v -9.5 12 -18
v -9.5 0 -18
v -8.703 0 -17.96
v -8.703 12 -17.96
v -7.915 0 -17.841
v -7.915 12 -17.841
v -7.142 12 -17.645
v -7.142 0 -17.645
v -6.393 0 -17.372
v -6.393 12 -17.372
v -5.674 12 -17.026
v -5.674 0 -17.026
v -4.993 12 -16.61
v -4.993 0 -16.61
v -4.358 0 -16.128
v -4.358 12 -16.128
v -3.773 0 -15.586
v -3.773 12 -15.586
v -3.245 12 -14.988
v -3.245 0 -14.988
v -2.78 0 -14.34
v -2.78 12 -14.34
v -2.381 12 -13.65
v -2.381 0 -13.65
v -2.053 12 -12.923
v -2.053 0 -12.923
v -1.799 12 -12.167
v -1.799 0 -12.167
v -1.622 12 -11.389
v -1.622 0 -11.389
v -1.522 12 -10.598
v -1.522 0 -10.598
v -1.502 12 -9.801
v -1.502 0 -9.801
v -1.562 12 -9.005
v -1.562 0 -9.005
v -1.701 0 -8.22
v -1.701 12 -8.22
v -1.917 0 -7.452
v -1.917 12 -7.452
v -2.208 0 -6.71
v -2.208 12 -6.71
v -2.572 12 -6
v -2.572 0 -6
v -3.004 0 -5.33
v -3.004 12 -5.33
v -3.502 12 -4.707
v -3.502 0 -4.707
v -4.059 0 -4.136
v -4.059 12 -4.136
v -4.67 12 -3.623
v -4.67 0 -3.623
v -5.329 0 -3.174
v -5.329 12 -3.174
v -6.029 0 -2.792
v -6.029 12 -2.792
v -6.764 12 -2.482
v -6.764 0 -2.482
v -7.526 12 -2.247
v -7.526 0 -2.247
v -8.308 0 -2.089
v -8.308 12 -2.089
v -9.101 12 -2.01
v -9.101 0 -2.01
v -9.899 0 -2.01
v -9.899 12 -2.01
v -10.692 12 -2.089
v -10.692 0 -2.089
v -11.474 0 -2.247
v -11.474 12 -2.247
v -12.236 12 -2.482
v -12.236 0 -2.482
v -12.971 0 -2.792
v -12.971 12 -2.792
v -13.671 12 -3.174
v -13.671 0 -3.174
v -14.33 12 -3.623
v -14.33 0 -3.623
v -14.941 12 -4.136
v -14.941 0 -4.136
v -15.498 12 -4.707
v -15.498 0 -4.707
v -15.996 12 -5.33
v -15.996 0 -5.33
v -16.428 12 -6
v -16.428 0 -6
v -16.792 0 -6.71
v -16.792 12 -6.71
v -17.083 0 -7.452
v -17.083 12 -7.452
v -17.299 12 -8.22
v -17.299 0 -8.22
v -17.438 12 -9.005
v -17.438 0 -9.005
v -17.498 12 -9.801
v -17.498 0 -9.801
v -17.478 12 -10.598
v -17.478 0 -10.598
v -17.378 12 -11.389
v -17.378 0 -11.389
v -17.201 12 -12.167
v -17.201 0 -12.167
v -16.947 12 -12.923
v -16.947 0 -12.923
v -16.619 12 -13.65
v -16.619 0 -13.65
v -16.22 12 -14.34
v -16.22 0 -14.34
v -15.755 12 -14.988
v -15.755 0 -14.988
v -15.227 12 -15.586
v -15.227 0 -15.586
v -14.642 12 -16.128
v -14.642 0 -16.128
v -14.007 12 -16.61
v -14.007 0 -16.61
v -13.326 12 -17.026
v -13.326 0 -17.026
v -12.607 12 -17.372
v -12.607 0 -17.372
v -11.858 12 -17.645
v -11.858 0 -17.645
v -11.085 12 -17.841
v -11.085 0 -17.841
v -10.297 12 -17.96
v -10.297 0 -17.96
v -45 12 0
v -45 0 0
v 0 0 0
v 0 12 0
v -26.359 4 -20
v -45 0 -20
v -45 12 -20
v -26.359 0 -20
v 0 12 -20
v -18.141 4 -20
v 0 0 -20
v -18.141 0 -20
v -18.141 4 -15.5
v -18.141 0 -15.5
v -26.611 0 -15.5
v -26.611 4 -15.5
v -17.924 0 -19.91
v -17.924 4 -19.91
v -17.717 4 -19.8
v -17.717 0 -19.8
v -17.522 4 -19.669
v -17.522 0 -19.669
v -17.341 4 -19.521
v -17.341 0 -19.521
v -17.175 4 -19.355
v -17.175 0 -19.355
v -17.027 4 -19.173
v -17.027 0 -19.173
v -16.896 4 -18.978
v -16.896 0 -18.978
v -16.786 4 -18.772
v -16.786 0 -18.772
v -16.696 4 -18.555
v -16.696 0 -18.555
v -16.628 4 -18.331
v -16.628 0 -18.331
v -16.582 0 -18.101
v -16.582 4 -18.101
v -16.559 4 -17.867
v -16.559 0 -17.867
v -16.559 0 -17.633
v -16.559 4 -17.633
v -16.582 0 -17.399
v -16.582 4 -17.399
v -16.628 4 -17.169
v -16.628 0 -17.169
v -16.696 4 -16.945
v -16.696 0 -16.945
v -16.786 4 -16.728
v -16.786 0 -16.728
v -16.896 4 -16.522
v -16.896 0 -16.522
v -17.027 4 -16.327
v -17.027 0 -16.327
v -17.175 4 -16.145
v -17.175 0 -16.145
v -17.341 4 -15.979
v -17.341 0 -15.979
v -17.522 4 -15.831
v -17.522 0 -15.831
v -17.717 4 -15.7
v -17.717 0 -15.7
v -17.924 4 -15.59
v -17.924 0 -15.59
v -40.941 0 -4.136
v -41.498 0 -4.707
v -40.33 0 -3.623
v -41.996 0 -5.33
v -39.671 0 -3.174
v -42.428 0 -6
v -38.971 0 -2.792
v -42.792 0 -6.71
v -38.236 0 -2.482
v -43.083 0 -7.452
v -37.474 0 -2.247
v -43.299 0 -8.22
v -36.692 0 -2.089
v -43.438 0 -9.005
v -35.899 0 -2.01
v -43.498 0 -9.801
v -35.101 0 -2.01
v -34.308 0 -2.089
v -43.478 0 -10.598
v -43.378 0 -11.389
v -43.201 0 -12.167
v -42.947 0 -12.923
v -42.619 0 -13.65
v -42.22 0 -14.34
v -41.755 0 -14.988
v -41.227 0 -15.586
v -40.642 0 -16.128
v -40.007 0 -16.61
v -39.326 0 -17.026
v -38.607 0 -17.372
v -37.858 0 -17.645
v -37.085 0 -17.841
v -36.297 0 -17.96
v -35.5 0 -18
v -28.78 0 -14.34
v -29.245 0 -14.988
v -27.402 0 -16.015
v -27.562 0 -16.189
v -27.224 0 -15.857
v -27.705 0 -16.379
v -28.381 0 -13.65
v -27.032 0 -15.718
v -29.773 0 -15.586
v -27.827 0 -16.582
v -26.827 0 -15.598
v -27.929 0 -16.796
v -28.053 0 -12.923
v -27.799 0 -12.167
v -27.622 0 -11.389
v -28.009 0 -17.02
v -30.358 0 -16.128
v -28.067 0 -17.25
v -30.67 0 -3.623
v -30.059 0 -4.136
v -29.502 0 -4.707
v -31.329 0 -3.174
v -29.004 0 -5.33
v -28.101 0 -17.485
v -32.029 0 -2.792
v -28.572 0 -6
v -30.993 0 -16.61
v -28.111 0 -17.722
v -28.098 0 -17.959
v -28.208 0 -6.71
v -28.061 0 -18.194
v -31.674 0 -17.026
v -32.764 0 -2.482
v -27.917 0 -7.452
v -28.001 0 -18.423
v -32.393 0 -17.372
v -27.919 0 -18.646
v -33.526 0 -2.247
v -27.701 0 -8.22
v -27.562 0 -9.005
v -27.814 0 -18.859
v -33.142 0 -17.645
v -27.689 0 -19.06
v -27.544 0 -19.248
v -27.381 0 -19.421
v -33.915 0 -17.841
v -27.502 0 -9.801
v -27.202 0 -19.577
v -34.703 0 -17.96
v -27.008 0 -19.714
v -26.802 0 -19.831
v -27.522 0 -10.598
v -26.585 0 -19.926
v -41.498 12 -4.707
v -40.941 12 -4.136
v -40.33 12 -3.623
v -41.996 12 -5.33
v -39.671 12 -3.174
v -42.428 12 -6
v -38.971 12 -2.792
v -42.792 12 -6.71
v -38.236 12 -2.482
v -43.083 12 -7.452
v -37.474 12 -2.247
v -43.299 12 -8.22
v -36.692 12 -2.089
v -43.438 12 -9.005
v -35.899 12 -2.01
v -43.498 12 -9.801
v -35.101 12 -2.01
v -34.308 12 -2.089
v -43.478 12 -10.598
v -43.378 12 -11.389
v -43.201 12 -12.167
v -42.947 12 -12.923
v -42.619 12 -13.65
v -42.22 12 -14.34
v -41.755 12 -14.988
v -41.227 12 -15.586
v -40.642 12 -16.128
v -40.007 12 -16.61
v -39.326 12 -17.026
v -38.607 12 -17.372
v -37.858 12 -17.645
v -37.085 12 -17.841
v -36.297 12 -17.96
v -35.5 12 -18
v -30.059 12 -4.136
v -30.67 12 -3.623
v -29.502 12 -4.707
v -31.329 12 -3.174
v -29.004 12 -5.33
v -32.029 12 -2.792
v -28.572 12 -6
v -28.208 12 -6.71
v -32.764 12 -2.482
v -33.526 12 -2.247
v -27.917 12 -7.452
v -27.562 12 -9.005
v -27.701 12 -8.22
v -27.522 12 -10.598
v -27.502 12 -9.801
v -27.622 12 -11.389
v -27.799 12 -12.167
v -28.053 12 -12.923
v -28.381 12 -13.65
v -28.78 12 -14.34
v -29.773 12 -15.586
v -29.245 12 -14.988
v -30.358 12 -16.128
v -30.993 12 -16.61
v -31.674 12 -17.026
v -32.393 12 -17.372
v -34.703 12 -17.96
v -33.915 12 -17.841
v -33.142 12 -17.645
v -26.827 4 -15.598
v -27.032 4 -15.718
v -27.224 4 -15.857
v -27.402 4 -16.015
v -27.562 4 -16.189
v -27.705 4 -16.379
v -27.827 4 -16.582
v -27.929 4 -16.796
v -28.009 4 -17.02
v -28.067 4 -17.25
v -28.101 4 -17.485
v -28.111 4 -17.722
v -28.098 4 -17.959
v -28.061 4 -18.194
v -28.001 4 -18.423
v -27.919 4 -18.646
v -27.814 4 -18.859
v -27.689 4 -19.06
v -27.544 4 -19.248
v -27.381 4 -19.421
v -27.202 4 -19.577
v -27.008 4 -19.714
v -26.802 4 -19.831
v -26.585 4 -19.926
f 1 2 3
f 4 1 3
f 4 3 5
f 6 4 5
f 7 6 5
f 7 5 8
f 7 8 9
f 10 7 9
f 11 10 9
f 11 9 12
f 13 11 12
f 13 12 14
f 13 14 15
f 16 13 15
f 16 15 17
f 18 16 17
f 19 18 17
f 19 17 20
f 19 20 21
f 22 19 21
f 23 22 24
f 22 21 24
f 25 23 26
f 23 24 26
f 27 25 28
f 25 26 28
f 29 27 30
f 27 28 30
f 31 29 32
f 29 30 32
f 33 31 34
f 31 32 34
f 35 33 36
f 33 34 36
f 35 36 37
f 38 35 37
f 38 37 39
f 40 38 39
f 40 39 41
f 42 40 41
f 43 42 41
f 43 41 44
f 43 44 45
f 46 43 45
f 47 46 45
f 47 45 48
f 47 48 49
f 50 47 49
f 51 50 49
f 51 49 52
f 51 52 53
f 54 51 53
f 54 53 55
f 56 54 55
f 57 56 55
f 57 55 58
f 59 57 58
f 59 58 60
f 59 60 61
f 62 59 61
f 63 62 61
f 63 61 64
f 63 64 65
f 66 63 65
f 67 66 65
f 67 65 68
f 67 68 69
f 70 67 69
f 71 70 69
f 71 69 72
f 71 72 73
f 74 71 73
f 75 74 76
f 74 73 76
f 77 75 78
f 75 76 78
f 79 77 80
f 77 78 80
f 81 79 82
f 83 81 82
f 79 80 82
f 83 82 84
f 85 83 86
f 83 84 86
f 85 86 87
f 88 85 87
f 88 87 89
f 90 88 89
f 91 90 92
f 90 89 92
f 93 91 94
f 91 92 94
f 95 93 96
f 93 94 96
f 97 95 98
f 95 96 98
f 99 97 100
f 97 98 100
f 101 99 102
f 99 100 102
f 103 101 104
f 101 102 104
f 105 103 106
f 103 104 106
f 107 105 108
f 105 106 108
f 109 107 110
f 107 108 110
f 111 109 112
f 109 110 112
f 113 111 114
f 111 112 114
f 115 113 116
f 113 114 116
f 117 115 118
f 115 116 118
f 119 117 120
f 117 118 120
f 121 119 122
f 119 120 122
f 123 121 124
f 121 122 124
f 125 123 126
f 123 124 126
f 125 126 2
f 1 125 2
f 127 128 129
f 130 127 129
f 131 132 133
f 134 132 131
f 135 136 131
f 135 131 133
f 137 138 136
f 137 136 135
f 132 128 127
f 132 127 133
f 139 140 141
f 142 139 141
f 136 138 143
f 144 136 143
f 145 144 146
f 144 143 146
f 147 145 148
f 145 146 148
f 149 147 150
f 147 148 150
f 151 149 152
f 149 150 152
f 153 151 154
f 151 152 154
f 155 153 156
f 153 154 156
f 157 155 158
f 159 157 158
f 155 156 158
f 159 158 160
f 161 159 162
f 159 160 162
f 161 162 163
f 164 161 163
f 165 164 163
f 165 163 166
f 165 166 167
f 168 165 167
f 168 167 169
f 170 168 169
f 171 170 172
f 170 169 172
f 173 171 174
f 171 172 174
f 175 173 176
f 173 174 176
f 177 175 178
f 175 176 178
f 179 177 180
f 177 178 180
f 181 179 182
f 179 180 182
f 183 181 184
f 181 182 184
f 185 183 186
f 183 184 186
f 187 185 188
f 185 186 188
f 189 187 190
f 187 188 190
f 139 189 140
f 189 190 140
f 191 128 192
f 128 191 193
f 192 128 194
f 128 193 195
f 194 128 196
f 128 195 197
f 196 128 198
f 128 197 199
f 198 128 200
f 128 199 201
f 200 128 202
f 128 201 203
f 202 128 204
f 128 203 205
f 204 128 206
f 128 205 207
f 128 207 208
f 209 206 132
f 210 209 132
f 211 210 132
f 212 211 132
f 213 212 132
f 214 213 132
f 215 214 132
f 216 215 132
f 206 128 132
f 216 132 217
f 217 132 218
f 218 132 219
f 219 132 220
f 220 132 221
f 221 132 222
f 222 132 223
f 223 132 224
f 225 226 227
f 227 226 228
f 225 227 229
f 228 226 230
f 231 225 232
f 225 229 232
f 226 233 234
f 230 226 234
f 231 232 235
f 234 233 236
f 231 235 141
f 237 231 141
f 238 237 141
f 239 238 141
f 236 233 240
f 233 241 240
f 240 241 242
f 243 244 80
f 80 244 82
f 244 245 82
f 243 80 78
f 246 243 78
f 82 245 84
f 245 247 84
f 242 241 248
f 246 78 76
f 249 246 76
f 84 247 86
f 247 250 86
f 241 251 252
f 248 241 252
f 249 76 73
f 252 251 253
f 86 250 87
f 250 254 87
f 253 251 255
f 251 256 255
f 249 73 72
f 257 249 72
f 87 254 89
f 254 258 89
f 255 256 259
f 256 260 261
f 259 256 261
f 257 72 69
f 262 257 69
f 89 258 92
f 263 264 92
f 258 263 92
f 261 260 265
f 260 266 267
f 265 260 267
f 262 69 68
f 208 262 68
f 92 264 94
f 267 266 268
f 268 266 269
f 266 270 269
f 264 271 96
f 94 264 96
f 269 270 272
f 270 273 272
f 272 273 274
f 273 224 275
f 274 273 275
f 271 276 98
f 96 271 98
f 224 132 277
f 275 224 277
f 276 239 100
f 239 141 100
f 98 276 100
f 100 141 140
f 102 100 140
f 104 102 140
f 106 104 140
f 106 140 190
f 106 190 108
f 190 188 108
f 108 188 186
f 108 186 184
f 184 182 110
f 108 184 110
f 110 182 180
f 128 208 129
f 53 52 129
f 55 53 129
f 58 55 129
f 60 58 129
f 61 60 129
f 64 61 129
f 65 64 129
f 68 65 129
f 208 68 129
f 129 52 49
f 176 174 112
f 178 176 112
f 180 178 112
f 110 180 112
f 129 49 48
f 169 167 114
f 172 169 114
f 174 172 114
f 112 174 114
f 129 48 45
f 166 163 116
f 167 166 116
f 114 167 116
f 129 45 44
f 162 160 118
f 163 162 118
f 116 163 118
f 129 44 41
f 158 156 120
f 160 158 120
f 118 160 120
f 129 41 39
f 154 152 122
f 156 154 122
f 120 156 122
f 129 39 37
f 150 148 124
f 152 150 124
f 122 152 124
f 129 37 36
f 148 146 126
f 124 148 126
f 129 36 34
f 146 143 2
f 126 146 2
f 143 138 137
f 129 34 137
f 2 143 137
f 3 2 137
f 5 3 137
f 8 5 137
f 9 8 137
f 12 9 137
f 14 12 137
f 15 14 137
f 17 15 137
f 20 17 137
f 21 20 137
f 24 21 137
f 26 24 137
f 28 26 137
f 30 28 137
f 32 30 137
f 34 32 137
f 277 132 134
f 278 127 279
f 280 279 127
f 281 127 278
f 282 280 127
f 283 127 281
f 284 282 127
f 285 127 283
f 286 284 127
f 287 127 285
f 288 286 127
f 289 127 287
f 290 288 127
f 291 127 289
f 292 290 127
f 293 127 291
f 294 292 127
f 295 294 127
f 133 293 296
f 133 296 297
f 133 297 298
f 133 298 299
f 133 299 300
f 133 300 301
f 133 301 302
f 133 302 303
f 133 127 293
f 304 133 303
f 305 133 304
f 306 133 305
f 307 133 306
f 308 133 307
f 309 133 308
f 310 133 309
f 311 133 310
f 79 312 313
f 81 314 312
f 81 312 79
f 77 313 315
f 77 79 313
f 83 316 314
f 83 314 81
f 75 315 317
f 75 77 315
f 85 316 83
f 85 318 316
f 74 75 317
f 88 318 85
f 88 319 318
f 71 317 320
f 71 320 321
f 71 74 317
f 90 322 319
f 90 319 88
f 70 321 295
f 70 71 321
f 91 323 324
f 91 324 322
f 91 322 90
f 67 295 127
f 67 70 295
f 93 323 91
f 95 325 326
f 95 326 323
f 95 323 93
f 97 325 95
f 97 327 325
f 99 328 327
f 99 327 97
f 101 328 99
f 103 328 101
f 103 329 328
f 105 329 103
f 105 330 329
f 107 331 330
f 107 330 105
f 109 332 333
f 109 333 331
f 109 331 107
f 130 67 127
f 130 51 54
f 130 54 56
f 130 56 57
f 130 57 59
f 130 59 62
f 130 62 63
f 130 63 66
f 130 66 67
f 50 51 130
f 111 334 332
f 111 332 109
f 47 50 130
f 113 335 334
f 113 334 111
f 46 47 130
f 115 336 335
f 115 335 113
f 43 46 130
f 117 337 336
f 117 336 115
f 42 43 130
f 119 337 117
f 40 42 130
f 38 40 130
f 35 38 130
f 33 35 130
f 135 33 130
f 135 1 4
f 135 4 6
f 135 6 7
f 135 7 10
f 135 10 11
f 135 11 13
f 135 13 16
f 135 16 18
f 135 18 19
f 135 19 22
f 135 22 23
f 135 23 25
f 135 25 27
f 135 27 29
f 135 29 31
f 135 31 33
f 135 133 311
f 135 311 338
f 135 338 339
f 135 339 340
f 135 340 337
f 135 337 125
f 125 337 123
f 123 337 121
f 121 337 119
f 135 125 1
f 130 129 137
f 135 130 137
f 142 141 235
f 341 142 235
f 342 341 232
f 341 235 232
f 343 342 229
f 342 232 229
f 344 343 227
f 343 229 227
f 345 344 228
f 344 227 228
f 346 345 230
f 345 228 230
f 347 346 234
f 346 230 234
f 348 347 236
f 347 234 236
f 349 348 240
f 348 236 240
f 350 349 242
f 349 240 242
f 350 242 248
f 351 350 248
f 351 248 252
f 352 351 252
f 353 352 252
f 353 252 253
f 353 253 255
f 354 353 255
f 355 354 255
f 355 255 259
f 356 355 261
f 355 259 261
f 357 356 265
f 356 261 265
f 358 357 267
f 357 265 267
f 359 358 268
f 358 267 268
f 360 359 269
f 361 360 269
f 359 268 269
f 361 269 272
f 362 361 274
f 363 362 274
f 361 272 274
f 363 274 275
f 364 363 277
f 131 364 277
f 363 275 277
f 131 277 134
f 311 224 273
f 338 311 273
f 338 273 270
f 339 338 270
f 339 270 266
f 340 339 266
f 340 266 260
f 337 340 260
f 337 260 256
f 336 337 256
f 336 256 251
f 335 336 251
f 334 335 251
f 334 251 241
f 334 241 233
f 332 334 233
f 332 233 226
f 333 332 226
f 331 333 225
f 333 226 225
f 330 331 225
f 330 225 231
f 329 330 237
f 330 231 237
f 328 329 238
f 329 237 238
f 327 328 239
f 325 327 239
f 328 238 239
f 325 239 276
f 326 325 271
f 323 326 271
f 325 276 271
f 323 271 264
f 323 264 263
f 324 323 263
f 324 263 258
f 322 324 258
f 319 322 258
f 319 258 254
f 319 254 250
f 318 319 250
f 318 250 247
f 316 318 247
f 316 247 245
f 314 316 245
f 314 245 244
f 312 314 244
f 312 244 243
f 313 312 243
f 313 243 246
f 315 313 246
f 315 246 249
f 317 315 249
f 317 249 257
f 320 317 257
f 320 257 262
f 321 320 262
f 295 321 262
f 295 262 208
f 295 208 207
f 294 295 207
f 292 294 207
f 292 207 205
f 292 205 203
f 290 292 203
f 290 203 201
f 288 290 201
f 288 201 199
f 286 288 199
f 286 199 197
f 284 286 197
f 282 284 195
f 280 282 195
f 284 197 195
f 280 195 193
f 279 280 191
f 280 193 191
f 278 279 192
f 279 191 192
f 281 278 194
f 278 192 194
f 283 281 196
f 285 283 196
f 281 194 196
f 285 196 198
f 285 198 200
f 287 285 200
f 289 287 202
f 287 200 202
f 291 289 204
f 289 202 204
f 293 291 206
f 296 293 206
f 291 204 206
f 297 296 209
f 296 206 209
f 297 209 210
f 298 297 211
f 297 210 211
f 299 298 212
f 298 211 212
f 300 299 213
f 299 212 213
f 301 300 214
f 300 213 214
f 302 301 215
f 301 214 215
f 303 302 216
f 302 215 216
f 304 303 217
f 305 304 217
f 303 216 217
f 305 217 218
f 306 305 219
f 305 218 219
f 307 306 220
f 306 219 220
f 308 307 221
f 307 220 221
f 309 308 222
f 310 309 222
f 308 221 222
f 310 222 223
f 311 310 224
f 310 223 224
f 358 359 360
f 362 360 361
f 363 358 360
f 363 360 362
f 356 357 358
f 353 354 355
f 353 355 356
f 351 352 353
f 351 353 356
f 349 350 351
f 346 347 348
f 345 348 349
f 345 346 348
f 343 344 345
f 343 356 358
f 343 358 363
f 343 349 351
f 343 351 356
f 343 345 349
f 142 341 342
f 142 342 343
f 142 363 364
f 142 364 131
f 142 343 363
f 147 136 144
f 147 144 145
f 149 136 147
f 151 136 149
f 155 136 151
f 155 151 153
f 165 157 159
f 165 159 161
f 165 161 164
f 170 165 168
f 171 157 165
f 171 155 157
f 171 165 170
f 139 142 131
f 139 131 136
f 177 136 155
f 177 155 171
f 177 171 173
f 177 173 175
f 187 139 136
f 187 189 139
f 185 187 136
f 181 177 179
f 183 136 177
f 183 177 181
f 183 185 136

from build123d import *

# Parameters (mm, degrees)
SKETCH1_W           = 45
SKETCH1_H           = 20
BOSS_EXTRUDE2_DEPTH = 12
SKETCH3_R           = 8
CUT_EXTRUDE1_DEPTH  = 51.68530359
CUT_EXTRUDE2_DEPTH  = 4


with BuildPart() as part:
    # Sketch1 → Boss-Extrude2 (new body)
    with BuildSketch(Plane(origin=(0, 0, 0), x_dir=(1, 0, 0), z_dir=(0, 1, 0))):
        with Locations((-22.5, 10)):
            Rectangle(SKETCH1_W, SKETCH1_H)
    extrude(amount=BOSS_EXTRUDE2_DEPTH)

    # Sketch3 → Cut-Extrude1 (cut, through all)
    with BuildSketch(Plane.XZ):
        with Locations(Location((-9.5, -10, 0), (0, 0, 270))):
            Circle(SKETCH3_R)
        with Locations(Location((-35.5, -10, 0), (0, 0, 270))):
            Circle(SKETCH3_R)
    extrude(amount=-CUT_EXTRUDE1_DEPTH, mode=Mode.SUBTRACT)

    # Sketch5 → Cut-Extrude2 (cut)
    with BuildSketch(Plane.XZ):
        with BuildLine():
            Line((-18.140833695, -15.5), (-26.610870323, -15.5))
            ThreePointArc((-26.610870323, -15.5), (-28.107672495, -17.840761906), (-26.359166305, -20))
            Line((-26.359166305, -20), (-18.140833695, -20))
            ThreePointArc((-18.140833695, -20), (-16.55661493, -17.75), (-18.140833695, -15.5))
        make_face()
    extrude(amount=-CUT_EXTRUDE2_DEPTH, mode=Mode.SUBTRACT)


solid = part.part
